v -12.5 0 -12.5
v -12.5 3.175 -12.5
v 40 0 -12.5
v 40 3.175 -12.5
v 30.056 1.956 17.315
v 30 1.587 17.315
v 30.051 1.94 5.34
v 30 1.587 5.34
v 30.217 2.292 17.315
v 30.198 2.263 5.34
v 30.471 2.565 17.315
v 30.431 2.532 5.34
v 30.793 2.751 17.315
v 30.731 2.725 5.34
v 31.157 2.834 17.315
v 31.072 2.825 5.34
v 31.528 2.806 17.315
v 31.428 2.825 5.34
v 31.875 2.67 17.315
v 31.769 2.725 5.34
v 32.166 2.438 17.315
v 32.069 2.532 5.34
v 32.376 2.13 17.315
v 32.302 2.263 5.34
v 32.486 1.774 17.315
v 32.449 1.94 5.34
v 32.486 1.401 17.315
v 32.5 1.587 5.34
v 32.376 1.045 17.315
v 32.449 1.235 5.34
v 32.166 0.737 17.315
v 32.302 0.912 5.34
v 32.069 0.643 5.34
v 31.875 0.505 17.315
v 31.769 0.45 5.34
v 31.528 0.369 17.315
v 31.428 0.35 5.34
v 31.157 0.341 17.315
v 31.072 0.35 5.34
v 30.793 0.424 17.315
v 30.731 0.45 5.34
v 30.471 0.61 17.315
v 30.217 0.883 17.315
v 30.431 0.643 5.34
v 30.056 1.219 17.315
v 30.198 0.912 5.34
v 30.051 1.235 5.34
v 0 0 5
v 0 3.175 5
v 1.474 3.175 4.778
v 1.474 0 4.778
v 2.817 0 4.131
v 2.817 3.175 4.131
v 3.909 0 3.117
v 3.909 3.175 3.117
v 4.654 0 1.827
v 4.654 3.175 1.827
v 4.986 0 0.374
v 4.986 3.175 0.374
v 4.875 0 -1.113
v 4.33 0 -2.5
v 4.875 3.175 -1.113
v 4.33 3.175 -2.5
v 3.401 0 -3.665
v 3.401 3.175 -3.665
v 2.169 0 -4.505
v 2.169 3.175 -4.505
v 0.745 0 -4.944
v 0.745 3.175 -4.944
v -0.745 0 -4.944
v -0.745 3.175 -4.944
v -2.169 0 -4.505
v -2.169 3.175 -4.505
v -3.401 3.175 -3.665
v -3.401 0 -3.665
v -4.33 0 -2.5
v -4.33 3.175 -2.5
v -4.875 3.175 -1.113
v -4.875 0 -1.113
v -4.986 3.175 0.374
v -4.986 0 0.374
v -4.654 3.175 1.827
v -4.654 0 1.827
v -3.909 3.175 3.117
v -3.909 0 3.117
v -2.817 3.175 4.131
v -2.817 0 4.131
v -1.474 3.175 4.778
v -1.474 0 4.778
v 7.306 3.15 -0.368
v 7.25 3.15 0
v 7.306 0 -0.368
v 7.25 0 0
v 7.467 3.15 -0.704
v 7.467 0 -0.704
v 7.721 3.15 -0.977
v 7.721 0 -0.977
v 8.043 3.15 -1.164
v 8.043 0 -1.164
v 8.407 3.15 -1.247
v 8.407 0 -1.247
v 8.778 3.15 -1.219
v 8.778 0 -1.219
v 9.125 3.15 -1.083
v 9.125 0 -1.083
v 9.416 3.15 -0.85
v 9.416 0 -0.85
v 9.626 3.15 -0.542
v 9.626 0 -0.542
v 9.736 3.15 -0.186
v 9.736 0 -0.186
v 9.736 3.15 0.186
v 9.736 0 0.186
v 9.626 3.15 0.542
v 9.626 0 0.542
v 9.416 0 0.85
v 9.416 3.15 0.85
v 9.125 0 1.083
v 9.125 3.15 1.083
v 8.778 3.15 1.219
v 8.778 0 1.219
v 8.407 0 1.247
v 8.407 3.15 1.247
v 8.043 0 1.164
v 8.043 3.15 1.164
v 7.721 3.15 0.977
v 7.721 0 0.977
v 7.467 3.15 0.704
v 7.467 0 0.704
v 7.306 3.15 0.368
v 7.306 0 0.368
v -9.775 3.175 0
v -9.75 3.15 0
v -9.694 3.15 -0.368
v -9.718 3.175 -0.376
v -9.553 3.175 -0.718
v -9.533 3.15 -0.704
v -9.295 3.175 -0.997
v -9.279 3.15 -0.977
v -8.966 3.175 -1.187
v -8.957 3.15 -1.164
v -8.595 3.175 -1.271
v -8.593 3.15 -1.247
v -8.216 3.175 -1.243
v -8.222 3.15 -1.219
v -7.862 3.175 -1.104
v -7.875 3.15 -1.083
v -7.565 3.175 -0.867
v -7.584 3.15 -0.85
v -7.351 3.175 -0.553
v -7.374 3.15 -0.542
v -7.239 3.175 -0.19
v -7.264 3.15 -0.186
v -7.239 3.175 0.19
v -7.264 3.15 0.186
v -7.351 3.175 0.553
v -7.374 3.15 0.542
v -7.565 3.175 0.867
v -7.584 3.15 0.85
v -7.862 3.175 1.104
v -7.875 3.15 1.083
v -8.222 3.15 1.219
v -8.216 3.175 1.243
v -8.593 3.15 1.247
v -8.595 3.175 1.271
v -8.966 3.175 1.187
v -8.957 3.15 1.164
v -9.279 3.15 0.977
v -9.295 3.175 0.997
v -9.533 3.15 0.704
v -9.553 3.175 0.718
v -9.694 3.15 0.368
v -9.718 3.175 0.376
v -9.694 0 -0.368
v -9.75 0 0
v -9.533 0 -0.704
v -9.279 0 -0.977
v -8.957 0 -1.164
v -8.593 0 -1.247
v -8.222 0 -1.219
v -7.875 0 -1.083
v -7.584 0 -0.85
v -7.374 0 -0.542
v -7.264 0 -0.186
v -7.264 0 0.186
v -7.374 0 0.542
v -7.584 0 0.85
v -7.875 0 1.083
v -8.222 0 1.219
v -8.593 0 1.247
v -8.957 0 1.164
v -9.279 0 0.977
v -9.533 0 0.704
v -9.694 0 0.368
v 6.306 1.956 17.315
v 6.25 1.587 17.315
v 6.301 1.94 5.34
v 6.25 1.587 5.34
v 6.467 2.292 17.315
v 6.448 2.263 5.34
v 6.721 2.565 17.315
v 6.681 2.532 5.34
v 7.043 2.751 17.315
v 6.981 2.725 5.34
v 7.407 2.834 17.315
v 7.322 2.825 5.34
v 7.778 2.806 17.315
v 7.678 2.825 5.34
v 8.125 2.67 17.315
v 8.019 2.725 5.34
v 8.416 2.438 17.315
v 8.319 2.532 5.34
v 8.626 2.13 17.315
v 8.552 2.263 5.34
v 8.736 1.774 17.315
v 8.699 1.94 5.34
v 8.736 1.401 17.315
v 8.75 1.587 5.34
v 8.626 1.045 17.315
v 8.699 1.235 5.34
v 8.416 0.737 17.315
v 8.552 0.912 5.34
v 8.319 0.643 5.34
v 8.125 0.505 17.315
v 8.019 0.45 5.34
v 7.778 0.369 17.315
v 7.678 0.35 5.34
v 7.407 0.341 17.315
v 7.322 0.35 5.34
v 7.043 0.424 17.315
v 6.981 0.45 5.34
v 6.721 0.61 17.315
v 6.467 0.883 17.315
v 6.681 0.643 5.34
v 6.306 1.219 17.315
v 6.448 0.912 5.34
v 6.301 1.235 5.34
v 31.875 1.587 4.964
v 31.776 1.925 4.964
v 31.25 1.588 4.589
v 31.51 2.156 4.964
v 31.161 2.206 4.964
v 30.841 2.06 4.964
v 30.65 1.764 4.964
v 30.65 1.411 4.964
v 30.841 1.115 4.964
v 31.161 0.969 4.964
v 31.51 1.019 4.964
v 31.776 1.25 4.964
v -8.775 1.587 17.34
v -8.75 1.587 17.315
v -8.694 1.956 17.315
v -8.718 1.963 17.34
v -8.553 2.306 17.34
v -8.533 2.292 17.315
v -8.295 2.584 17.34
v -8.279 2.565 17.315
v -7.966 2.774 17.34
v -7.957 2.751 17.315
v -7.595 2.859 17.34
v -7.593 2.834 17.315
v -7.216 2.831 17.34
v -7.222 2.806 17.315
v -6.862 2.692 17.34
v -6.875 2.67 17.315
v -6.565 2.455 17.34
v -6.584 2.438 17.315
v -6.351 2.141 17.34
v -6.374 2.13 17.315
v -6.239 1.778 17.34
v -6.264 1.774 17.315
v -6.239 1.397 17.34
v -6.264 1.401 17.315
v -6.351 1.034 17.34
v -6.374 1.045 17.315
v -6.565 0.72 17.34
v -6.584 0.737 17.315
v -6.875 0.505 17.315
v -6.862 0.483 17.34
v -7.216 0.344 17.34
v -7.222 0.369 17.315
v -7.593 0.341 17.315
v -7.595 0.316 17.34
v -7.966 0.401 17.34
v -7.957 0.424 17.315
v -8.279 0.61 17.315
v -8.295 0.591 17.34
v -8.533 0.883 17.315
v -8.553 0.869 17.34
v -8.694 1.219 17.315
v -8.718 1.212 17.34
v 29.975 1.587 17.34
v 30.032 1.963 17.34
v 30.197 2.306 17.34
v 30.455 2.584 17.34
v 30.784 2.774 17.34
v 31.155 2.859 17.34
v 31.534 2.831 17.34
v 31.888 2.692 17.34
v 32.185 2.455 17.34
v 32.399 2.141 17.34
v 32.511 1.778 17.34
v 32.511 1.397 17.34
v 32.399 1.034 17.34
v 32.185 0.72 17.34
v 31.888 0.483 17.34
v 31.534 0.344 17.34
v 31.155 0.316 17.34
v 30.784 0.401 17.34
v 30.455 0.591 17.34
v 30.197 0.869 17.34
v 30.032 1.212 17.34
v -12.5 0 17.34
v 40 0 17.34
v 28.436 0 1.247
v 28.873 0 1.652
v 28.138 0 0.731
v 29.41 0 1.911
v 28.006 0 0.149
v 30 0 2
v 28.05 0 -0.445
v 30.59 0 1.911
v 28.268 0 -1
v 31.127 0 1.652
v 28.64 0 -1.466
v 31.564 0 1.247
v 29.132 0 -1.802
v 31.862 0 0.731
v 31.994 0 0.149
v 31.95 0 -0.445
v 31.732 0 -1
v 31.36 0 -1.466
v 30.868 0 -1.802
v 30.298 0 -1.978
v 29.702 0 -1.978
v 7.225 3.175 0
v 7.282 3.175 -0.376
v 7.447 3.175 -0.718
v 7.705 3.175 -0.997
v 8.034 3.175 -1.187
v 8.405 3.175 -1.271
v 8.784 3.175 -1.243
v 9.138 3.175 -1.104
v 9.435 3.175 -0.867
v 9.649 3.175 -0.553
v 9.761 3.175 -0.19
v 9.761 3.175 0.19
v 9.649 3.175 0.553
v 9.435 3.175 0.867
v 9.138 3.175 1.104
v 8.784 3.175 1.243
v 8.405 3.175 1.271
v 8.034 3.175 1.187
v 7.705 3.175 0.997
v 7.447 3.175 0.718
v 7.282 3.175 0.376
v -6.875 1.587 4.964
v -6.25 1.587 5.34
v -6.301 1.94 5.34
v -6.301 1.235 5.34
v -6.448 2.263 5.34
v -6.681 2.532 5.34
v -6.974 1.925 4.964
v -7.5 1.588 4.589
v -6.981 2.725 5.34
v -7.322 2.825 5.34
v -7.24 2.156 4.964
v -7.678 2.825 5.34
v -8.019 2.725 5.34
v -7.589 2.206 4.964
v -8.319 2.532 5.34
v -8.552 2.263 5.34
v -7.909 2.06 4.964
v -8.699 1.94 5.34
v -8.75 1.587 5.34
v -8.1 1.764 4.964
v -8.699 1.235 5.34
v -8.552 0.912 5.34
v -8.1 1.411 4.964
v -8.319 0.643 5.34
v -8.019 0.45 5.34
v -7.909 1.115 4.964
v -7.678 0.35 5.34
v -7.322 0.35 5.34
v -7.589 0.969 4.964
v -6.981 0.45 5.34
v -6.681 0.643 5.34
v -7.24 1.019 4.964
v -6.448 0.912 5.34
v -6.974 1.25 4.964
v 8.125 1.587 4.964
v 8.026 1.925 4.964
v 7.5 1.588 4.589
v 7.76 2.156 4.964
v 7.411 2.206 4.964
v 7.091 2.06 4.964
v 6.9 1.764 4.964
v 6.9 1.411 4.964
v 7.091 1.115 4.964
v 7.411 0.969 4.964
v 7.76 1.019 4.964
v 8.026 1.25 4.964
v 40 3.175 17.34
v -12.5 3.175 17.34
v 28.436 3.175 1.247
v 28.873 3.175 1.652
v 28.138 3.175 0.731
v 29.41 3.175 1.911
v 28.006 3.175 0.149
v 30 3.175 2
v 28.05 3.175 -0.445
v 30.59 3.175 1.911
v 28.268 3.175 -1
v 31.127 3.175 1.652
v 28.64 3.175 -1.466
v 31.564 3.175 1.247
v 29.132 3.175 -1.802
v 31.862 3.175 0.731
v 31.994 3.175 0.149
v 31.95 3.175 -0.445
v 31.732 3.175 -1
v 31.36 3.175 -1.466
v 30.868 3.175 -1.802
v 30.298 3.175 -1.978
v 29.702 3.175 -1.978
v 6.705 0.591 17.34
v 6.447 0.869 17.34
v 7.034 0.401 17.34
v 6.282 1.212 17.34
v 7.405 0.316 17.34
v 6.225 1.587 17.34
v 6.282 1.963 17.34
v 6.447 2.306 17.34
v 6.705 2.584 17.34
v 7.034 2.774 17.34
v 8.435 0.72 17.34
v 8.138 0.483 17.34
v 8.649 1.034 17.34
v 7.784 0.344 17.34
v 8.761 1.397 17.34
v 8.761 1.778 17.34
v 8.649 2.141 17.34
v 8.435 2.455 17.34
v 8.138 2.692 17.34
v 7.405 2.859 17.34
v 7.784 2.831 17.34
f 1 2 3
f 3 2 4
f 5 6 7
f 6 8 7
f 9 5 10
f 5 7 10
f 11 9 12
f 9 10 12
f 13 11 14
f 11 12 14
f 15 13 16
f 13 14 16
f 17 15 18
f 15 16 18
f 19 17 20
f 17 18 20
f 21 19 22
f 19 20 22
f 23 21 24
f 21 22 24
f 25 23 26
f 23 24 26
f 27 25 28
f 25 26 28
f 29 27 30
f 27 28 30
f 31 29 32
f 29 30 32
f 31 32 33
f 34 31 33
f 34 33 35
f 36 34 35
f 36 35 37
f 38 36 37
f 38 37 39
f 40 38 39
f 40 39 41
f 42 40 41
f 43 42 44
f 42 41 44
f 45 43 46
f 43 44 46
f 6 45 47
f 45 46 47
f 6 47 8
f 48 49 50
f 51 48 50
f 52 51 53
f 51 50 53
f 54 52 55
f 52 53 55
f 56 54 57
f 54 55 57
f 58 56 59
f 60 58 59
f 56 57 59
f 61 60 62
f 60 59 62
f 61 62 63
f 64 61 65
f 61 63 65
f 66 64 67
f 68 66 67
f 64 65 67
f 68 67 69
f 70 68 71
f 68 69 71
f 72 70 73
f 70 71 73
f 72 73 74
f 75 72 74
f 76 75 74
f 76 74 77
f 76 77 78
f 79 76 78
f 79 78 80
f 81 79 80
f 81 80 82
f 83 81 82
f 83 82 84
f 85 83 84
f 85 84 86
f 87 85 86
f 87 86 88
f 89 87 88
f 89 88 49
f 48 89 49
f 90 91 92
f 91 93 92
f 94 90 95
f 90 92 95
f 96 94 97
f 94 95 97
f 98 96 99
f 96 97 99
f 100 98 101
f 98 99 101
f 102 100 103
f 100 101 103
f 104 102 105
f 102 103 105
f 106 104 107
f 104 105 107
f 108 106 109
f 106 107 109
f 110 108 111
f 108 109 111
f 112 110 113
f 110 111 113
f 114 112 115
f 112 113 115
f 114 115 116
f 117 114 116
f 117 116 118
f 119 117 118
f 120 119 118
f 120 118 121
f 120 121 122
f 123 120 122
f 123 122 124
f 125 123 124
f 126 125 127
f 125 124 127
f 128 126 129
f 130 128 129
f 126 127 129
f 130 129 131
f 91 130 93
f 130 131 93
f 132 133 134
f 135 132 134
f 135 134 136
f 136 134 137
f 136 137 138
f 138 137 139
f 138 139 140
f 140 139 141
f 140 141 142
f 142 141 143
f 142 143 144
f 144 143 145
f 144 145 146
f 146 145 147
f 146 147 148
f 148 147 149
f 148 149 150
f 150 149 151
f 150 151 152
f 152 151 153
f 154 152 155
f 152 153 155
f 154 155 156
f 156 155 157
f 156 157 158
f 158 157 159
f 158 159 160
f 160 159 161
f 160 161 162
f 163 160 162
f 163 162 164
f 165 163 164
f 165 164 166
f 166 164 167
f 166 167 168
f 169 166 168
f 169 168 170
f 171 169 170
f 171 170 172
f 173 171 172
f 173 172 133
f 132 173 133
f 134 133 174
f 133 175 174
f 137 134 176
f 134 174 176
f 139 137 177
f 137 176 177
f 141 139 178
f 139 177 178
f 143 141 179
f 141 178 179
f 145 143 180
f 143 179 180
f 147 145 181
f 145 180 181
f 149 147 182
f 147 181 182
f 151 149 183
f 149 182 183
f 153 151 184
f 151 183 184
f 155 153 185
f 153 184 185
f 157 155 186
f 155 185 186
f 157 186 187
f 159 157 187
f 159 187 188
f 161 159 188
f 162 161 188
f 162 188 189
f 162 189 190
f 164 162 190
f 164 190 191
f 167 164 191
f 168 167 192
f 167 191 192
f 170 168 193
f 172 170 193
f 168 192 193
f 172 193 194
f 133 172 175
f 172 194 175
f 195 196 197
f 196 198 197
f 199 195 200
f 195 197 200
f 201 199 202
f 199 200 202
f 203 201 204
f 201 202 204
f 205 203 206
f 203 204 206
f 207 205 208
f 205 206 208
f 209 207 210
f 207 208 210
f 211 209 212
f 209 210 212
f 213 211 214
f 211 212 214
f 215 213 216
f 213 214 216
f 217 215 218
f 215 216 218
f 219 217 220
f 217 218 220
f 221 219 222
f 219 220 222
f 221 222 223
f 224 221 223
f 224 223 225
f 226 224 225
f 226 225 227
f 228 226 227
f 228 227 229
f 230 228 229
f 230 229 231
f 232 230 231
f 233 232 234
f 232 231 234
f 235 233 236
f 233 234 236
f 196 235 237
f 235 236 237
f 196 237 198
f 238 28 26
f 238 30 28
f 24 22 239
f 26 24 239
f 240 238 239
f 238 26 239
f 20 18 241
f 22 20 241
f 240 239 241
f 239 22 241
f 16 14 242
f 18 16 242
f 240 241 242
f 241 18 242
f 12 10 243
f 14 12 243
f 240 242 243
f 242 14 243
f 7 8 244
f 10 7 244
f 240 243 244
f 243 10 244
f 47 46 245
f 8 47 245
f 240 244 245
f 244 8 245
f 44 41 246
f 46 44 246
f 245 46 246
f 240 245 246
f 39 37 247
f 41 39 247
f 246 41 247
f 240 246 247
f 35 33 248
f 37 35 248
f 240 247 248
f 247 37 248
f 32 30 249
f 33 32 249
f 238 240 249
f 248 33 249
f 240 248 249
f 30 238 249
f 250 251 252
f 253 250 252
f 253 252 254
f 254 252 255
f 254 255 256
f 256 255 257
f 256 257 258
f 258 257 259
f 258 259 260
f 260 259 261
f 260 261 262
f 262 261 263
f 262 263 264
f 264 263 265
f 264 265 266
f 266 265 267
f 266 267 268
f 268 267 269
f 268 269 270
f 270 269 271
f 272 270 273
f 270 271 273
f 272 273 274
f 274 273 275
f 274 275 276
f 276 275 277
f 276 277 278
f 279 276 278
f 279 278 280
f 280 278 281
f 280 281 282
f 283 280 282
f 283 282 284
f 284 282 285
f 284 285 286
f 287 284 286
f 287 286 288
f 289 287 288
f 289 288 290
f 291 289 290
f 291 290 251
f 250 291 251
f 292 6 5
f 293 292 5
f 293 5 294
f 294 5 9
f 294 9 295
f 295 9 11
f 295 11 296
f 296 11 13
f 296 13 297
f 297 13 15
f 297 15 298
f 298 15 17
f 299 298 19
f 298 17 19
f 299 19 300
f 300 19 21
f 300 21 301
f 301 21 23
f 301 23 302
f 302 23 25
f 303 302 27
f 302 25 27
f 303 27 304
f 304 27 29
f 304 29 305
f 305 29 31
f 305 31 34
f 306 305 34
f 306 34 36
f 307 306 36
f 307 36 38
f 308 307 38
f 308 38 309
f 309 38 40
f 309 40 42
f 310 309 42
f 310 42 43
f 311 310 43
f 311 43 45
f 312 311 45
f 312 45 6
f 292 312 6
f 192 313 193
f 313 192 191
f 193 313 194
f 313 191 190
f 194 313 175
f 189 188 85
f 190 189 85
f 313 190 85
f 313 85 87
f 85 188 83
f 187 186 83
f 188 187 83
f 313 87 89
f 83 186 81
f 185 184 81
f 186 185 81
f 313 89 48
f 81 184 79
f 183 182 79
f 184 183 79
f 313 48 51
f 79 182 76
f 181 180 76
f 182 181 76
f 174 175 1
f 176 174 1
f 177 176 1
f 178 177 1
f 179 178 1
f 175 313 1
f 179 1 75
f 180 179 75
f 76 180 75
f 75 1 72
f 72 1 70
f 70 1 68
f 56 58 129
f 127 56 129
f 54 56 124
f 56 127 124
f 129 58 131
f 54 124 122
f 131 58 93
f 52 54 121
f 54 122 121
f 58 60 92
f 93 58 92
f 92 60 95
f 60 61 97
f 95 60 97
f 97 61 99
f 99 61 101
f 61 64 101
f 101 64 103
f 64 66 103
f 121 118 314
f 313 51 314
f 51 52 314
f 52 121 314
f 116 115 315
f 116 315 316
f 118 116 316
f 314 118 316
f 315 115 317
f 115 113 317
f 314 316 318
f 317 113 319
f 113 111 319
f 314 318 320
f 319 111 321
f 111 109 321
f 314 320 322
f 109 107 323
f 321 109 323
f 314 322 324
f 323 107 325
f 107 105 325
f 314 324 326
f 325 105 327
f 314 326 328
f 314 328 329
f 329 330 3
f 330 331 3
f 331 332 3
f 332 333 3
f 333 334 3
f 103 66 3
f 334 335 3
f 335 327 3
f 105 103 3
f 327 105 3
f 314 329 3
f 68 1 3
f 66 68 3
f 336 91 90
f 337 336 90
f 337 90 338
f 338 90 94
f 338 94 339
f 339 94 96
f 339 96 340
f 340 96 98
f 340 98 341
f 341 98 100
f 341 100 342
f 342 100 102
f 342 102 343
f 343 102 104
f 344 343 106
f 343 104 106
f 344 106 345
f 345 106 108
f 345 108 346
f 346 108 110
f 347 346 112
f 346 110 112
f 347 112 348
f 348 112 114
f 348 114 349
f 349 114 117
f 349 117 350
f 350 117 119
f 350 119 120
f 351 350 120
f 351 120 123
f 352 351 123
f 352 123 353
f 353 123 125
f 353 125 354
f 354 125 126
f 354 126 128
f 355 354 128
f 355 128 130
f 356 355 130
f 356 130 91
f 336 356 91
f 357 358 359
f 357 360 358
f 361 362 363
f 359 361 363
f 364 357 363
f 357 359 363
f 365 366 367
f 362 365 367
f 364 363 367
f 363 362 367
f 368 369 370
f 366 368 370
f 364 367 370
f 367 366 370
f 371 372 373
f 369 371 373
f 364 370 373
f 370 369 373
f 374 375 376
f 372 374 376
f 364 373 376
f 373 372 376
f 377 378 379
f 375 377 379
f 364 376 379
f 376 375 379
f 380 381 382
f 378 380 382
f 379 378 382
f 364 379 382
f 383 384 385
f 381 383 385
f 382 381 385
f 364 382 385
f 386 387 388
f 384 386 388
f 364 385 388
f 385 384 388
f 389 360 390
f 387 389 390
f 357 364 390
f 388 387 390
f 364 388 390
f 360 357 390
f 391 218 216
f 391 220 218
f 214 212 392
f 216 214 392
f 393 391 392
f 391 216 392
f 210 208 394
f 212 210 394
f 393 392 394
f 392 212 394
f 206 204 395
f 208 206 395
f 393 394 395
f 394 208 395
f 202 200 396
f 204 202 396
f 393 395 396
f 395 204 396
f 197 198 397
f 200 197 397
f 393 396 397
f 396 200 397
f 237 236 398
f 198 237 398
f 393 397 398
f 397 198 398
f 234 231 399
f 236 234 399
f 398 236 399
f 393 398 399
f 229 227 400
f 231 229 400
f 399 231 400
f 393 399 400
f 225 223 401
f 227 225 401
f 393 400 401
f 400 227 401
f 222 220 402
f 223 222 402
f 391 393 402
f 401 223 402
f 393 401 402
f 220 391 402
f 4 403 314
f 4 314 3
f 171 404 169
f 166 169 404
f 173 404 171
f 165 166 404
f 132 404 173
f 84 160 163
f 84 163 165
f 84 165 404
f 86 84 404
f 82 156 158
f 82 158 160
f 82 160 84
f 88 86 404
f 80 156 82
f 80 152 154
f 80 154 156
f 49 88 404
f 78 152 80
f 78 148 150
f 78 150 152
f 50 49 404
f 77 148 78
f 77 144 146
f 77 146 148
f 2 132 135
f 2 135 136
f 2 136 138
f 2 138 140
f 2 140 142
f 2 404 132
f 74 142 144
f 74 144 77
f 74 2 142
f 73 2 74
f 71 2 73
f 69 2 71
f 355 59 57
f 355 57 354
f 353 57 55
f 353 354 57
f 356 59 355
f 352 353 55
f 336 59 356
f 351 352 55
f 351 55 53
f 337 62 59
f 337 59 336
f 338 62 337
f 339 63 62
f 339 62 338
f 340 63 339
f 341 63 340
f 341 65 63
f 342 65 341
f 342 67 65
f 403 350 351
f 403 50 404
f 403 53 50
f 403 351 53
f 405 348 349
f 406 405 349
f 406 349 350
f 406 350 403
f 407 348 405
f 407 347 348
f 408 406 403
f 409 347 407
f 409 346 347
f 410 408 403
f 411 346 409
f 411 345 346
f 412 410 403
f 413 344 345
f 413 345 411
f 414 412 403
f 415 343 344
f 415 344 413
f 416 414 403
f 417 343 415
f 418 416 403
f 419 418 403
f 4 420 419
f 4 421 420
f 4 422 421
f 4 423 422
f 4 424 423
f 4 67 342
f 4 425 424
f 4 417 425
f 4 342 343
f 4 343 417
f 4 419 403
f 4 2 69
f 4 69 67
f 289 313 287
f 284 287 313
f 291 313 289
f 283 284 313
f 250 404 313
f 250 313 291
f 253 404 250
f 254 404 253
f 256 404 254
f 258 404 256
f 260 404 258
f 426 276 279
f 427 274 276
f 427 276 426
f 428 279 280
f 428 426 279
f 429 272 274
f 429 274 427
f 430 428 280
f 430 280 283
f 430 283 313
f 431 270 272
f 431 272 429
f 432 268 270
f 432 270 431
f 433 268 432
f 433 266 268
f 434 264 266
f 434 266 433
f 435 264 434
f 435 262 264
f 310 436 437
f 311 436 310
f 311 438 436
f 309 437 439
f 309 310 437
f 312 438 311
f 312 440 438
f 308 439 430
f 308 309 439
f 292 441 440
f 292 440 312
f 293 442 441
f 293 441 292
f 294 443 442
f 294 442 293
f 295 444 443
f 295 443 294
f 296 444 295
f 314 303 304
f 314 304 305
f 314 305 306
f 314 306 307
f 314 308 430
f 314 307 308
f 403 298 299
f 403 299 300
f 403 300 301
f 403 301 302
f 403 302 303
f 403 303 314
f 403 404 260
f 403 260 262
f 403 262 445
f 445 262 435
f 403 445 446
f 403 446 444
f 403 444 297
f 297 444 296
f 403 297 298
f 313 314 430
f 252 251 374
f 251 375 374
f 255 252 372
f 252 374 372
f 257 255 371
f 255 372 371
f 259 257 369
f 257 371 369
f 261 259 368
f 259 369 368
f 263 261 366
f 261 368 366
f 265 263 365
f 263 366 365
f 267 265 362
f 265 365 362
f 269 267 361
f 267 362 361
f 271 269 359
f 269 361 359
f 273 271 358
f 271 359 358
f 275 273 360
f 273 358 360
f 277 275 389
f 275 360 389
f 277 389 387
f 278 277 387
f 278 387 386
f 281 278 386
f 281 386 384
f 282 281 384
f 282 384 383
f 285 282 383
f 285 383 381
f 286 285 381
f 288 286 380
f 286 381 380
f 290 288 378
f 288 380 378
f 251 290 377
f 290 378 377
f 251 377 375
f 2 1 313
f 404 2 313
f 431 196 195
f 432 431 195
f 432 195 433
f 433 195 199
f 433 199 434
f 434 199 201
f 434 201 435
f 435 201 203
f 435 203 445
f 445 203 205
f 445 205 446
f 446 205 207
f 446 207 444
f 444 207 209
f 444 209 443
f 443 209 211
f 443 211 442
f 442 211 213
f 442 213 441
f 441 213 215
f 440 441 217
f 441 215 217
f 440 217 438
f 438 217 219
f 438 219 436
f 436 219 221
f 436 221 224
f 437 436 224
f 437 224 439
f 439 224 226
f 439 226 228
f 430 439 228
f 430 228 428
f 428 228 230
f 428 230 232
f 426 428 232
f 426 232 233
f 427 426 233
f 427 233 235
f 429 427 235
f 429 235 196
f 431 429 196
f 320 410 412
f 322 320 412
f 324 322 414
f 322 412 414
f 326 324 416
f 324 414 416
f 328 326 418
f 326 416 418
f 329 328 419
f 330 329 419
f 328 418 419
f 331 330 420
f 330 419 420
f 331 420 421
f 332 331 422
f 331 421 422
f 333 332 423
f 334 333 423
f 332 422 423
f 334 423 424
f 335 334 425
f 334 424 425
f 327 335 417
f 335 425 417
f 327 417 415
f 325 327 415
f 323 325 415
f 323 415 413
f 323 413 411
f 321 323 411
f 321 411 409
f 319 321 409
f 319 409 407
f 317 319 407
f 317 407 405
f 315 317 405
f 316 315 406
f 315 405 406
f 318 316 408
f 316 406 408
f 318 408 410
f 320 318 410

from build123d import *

# Parameters (mm, degrees)
BOSS_EXTRUDE1_DEPTH                   = 3.175
TAP_DRILL_FOR_M3X0_5_TAP1_D           = 2.5
TAP_DRILL_FOR_M3X0_5_TAP1_CSINK_D     = 2.55
TAP_DRILL_FOR_M3X0_5_TAP1_CSINK_ANGLE = 90
CUT_EXTRUDE1_REACH                    = 23.61
SKETCH8_R                             = 5
SKETCH9_W                             = 27.5
SKETCH9_H                             = 29.84
SKETCH9_R                             = 2
BOSS_EXTRUDE2_DEPTH                   = 3.175
TAP_DRILL_FOR_M3X0_5_TAP2_D           = 2.5
TAP_DRILL_FOR_M3X0_5_TAP2_DEPTH       = 12
TAP_DRILL_FOR_M3X0_5_TAP2_CSINK_D     = 2.55
TAP_DRILL_FOR_M3X0_5_TAP2_CSINK_ANGLE = 90
TAP_DRILL_FOR_M3X0_5_TAP2_TIP         = 0.751075774


with BuildPart() as part:
    # Sketch1 → Boss-Extrude1 (new body)
    with BuildSketch(Plane(origin=(0, 0, 0), x_dir=(1, 0, 0), z_dir=(0, 1, 0))):
        Polygon((-12.5, -12.5), (-12.5, -17.34), (12.5, -17.34), (12.5, -12.5), (12.5, 12.5), (-12.5, 12.5), align=None)
    extrude(amount=BOSS_EXTRUDE1_DEPTH)

    # Tap Drill for M3x0.5 Tap1 (through all)
    with Locations(Plane(origin=(0, 3.175, 0), x_dir=(1, 0, 0), z_dir=(0, 1, 0))):
        with Locations((-8.5, 0), (8.5, 0)):
            CounterSinkHole(TAP_DRILL_FOR_M3X0_5_TAP1_D / 2, TAP_DRILL_FOR_M3X0_5_TAP1_CSINK_D / 2, counter_sink_angle=TAP_DRILL_FOR_M3X0_5_TAP1_CSINK_ANGLE)

    # Sketch8 → Cut-Extrude1 (cut, up to next)
    with BuildSketch(Plane(origin=(0, 3.175, 0), x_dir=(1, 0, 0), z_dir=(0, 1, 0)), mode=Mode.PRIVATE) as cut_extrude1_sk1:
        with Locations(Location((0, 0, 0), (0, 0, 270))):
            Circle(SKETCH8_R)
    cut_extrude1_tool1 = extrude(cut_extrude1_sk1.sketch, amount=-CUT_EXTRUDE1_REACH, mode=Mode.PRIVATE) & part.part
    add(cut_extrude1_tool1.solids().sort_by_distance((0, 3.175, 0))[0], mode=Mode.SUBTRACT)

    # Sketch9 → Boss-Extrude2 (add)
    with BuildSketch(Plane(origin=(0, 3.175, 0), x_dir=(1, 0, 0), z_dir=(0, 1, 0))):
        with Locations((26.25, -2.42)):
            Rectangle(SKETCH9_W, SKETCH9_H)
        with Locations(Location((30, 0, 0), (0, 0, 270))):
            Circle(SKETCH9_R, mode=Mode.SUBTRACT)
    extrude(amount=-BOSS_EXTRUDE2_DEPTH)

    # Tap Drill for M3x0.5 Tap2
    with Locations(Plane.XY.offset(17.34)):
        with Locations((-7.5, 1.5875), (7.5, 1.5875), (31.25, 1.5875)):
            CounterSinkHole(TAP_DRILL_FOR_M3X0_5_TAP2_D / 2, TAP_DRILL_FOR_M3X0_5_TAP2_CSINK_D / 2, depth=TAP_DRILL_FOR_M3X0_5_TAP2_DEPTH, counter_sink_angle=TAP_DRILL_FOR_M3X0_5_TAP2_CSINK_ANGLE)
            with Locations((0, 0, -(TAP_DRILL_FOR_M3X0_5_TAP2_DEPTH + TAP_DRILL_FOR_M3X0_5_TAP2_TIP / 2))):  # 118° drill point
                Cone(0, TAP_DRILL_FOR_M3X0_5_TAP2_D / 2, TAP_DRILL_FOR_M3X0_5_TAP2_TIP, mode=Mode.SUBTRACT)


solid = part.part
